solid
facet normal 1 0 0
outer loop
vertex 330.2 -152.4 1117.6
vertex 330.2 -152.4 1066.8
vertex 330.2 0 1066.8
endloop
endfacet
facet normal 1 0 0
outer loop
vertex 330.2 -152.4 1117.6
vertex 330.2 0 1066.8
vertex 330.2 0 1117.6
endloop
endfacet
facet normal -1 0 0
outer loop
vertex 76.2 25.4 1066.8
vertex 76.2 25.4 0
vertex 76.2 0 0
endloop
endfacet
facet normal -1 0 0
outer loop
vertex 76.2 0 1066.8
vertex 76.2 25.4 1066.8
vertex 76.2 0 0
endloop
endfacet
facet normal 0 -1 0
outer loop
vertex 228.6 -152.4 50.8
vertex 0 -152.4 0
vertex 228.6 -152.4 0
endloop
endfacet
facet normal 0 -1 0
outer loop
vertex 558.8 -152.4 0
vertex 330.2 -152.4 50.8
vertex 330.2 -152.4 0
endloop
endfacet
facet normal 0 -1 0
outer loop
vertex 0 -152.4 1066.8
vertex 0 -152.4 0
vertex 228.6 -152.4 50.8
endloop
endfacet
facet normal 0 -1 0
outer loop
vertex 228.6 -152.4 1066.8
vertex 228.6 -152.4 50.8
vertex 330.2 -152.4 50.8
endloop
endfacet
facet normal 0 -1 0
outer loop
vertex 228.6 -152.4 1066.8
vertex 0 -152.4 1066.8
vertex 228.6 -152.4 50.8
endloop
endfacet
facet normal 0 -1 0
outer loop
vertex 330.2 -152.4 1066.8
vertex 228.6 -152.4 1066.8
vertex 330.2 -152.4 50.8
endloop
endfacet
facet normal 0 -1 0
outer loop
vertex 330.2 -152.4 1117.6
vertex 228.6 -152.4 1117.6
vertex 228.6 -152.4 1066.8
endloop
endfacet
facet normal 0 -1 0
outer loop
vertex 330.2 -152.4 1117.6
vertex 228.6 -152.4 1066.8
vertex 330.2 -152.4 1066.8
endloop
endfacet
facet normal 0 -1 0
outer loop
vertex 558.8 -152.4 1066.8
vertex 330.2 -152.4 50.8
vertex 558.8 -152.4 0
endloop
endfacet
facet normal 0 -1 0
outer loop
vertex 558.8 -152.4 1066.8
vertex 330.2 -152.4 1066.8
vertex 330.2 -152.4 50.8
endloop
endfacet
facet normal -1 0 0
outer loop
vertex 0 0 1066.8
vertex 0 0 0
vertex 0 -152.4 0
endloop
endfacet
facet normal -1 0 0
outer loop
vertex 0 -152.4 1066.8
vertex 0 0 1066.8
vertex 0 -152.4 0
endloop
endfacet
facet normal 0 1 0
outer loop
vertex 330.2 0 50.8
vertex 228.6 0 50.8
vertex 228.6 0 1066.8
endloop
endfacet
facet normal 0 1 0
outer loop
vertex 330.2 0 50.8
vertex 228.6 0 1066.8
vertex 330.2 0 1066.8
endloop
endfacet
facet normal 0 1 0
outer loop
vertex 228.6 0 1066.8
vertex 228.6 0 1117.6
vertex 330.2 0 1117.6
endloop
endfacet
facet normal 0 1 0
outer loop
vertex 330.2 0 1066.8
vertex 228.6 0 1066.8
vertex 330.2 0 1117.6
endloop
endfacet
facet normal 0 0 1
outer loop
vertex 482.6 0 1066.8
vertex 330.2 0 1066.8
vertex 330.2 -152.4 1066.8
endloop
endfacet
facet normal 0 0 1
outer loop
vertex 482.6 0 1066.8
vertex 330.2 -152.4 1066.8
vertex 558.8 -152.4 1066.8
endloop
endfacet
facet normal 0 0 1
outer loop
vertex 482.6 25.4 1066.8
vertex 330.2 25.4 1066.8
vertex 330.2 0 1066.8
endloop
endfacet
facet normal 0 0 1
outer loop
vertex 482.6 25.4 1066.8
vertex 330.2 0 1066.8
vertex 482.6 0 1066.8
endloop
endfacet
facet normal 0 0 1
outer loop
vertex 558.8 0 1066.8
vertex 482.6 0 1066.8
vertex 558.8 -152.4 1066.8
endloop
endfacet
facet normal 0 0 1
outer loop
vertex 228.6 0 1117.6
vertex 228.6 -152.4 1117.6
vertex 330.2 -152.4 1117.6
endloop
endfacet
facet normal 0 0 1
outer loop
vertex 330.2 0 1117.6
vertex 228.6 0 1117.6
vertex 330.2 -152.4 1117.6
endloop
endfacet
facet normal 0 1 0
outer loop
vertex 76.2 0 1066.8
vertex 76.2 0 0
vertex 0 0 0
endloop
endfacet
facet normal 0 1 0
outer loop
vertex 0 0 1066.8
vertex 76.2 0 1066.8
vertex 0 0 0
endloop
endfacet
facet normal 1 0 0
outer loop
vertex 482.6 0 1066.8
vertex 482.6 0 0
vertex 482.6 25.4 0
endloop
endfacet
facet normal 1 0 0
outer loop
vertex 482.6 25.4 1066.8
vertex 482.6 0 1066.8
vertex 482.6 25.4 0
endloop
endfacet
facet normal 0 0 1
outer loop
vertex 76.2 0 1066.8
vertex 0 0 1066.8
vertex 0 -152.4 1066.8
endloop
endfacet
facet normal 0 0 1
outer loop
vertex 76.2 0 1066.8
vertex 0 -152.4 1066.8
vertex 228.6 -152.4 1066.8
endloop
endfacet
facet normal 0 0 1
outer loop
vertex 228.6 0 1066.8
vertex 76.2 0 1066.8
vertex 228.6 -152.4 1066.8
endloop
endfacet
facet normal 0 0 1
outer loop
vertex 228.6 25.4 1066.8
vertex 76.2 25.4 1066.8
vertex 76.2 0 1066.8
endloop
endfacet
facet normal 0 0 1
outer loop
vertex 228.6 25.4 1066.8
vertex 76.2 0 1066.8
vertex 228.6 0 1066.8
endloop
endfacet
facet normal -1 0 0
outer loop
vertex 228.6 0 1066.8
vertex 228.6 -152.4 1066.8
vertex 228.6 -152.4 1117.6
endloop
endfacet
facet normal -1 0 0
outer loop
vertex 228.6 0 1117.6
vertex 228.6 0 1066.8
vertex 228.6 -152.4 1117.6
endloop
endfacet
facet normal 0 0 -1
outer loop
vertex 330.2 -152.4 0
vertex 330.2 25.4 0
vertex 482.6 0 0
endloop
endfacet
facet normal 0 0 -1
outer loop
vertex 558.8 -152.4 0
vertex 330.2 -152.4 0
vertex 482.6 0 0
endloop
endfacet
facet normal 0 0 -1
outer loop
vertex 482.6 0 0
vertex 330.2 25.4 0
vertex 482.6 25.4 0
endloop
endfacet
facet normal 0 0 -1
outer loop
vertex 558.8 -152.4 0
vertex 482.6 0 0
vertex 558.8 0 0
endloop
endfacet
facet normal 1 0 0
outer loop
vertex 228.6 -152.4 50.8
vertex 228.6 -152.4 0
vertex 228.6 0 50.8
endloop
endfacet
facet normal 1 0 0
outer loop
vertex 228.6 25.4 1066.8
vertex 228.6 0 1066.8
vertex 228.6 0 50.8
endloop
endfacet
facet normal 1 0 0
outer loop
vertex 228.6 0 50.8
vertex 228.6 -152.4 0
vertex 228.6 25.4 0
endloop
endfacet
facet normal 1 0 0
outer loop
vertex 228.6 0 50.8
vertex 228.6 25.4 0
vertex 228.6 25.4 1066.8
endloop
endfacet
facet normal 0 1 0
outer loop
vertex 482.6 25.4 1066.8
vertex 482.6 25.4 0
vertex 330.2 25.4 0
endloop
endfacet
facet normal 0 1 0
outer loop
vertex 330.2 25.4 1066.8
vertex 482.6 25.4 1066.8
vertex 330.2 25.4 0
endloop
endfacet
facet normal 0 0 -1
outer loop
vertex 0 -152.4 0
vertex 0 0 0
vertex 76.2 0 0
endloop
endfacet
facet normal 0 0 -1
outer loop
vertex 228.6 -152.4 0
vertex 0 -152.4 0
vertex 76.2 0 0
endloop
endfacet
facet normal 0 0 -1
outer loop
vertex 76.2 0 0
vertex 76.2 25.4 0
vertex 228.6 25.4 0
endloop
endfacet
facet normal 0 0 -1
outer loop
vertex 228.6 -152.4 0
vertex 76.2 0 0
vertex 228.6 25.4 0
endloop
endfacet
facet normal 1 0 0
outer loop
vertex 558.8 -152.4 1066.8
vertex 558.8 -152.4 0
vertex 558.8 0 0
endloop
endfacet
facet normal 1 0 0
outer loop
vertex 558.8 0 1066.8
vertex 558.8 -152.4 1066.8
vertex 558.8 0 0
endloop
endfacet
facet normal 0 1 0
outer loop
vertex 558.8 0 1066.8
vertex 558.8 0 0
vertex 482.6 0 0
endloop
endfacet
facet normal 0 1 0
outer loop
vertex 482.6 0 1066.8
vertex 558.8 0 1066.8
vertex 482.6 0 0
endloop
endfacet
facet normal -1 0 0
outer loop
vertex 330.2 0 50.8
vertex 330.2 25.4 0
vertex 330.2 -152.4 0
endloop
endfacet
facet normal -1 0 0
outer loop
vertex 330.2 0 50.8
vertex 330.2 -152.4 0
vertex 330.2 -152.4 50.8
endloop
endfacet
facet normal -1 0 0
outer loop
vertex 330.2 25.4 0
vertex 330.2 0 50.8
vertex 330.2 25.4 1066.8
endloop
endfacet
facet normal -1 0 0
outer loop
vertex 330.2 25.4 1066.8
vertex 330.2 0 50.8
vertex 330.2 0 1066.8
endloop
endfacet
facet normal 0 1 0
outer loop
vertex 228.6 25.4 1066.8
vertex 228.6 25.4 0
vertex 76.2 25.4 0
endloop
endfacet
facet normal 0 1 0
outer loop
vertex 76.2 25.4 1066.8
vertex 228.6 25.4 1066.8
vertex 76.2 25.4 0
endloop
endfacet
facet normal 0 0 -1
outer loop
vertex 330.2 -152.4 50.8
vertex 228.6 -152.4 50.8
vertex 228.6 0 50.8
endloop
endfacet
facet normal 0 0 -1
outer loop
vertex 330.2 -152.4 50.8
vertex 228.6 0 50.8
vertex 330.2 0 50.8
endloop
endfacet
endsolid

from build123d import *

# Parameters (mm, degrees)
F1_DEPTH = 1066.8
F3_W     = 101.6
F3_H     = 50.8
F4_DEPTH = 152.4
F5_W     = 101.6
F5_H     = 50.8
F6_DEPTH = 177.801


with BuildPart() as f1:
    # F0 (on Top) → F1 (new body)
    with BuildSketch(Plane.XY):
        Polygon((76.2, 0), (0, 0), (0, -152.4), (558.8, -152.4), (558.8, 0), (482.6, 0), (482.6, 25.4), (330.2, 25.4), (330.2, 0), (228.6, 0), (228.6, 25.4), (76.2, 25.4), align=None)
    extrude(amount=F1_DEPTH)

    # F3 (on offset) → F4 (join)
    with BuildSketch(Plane.XZ.offset(152.4)):
        with Locations((279.4, 1092.2)):
            Rectangle(F3_W, F3_H)
    extrude(amount=-F4_DEPTH)

    # F5 (on offset) → F6 (cut, through all)
    with BuildSketch(Plane.XZ.offset(152.4)):
        with Locations((279.4, 25.4)):
            Rectangle(F5_W, F5_H)
    extrude(amount=-F6_DEPTH, mode=Mode.SUBTRACT)


solid = f1.part
